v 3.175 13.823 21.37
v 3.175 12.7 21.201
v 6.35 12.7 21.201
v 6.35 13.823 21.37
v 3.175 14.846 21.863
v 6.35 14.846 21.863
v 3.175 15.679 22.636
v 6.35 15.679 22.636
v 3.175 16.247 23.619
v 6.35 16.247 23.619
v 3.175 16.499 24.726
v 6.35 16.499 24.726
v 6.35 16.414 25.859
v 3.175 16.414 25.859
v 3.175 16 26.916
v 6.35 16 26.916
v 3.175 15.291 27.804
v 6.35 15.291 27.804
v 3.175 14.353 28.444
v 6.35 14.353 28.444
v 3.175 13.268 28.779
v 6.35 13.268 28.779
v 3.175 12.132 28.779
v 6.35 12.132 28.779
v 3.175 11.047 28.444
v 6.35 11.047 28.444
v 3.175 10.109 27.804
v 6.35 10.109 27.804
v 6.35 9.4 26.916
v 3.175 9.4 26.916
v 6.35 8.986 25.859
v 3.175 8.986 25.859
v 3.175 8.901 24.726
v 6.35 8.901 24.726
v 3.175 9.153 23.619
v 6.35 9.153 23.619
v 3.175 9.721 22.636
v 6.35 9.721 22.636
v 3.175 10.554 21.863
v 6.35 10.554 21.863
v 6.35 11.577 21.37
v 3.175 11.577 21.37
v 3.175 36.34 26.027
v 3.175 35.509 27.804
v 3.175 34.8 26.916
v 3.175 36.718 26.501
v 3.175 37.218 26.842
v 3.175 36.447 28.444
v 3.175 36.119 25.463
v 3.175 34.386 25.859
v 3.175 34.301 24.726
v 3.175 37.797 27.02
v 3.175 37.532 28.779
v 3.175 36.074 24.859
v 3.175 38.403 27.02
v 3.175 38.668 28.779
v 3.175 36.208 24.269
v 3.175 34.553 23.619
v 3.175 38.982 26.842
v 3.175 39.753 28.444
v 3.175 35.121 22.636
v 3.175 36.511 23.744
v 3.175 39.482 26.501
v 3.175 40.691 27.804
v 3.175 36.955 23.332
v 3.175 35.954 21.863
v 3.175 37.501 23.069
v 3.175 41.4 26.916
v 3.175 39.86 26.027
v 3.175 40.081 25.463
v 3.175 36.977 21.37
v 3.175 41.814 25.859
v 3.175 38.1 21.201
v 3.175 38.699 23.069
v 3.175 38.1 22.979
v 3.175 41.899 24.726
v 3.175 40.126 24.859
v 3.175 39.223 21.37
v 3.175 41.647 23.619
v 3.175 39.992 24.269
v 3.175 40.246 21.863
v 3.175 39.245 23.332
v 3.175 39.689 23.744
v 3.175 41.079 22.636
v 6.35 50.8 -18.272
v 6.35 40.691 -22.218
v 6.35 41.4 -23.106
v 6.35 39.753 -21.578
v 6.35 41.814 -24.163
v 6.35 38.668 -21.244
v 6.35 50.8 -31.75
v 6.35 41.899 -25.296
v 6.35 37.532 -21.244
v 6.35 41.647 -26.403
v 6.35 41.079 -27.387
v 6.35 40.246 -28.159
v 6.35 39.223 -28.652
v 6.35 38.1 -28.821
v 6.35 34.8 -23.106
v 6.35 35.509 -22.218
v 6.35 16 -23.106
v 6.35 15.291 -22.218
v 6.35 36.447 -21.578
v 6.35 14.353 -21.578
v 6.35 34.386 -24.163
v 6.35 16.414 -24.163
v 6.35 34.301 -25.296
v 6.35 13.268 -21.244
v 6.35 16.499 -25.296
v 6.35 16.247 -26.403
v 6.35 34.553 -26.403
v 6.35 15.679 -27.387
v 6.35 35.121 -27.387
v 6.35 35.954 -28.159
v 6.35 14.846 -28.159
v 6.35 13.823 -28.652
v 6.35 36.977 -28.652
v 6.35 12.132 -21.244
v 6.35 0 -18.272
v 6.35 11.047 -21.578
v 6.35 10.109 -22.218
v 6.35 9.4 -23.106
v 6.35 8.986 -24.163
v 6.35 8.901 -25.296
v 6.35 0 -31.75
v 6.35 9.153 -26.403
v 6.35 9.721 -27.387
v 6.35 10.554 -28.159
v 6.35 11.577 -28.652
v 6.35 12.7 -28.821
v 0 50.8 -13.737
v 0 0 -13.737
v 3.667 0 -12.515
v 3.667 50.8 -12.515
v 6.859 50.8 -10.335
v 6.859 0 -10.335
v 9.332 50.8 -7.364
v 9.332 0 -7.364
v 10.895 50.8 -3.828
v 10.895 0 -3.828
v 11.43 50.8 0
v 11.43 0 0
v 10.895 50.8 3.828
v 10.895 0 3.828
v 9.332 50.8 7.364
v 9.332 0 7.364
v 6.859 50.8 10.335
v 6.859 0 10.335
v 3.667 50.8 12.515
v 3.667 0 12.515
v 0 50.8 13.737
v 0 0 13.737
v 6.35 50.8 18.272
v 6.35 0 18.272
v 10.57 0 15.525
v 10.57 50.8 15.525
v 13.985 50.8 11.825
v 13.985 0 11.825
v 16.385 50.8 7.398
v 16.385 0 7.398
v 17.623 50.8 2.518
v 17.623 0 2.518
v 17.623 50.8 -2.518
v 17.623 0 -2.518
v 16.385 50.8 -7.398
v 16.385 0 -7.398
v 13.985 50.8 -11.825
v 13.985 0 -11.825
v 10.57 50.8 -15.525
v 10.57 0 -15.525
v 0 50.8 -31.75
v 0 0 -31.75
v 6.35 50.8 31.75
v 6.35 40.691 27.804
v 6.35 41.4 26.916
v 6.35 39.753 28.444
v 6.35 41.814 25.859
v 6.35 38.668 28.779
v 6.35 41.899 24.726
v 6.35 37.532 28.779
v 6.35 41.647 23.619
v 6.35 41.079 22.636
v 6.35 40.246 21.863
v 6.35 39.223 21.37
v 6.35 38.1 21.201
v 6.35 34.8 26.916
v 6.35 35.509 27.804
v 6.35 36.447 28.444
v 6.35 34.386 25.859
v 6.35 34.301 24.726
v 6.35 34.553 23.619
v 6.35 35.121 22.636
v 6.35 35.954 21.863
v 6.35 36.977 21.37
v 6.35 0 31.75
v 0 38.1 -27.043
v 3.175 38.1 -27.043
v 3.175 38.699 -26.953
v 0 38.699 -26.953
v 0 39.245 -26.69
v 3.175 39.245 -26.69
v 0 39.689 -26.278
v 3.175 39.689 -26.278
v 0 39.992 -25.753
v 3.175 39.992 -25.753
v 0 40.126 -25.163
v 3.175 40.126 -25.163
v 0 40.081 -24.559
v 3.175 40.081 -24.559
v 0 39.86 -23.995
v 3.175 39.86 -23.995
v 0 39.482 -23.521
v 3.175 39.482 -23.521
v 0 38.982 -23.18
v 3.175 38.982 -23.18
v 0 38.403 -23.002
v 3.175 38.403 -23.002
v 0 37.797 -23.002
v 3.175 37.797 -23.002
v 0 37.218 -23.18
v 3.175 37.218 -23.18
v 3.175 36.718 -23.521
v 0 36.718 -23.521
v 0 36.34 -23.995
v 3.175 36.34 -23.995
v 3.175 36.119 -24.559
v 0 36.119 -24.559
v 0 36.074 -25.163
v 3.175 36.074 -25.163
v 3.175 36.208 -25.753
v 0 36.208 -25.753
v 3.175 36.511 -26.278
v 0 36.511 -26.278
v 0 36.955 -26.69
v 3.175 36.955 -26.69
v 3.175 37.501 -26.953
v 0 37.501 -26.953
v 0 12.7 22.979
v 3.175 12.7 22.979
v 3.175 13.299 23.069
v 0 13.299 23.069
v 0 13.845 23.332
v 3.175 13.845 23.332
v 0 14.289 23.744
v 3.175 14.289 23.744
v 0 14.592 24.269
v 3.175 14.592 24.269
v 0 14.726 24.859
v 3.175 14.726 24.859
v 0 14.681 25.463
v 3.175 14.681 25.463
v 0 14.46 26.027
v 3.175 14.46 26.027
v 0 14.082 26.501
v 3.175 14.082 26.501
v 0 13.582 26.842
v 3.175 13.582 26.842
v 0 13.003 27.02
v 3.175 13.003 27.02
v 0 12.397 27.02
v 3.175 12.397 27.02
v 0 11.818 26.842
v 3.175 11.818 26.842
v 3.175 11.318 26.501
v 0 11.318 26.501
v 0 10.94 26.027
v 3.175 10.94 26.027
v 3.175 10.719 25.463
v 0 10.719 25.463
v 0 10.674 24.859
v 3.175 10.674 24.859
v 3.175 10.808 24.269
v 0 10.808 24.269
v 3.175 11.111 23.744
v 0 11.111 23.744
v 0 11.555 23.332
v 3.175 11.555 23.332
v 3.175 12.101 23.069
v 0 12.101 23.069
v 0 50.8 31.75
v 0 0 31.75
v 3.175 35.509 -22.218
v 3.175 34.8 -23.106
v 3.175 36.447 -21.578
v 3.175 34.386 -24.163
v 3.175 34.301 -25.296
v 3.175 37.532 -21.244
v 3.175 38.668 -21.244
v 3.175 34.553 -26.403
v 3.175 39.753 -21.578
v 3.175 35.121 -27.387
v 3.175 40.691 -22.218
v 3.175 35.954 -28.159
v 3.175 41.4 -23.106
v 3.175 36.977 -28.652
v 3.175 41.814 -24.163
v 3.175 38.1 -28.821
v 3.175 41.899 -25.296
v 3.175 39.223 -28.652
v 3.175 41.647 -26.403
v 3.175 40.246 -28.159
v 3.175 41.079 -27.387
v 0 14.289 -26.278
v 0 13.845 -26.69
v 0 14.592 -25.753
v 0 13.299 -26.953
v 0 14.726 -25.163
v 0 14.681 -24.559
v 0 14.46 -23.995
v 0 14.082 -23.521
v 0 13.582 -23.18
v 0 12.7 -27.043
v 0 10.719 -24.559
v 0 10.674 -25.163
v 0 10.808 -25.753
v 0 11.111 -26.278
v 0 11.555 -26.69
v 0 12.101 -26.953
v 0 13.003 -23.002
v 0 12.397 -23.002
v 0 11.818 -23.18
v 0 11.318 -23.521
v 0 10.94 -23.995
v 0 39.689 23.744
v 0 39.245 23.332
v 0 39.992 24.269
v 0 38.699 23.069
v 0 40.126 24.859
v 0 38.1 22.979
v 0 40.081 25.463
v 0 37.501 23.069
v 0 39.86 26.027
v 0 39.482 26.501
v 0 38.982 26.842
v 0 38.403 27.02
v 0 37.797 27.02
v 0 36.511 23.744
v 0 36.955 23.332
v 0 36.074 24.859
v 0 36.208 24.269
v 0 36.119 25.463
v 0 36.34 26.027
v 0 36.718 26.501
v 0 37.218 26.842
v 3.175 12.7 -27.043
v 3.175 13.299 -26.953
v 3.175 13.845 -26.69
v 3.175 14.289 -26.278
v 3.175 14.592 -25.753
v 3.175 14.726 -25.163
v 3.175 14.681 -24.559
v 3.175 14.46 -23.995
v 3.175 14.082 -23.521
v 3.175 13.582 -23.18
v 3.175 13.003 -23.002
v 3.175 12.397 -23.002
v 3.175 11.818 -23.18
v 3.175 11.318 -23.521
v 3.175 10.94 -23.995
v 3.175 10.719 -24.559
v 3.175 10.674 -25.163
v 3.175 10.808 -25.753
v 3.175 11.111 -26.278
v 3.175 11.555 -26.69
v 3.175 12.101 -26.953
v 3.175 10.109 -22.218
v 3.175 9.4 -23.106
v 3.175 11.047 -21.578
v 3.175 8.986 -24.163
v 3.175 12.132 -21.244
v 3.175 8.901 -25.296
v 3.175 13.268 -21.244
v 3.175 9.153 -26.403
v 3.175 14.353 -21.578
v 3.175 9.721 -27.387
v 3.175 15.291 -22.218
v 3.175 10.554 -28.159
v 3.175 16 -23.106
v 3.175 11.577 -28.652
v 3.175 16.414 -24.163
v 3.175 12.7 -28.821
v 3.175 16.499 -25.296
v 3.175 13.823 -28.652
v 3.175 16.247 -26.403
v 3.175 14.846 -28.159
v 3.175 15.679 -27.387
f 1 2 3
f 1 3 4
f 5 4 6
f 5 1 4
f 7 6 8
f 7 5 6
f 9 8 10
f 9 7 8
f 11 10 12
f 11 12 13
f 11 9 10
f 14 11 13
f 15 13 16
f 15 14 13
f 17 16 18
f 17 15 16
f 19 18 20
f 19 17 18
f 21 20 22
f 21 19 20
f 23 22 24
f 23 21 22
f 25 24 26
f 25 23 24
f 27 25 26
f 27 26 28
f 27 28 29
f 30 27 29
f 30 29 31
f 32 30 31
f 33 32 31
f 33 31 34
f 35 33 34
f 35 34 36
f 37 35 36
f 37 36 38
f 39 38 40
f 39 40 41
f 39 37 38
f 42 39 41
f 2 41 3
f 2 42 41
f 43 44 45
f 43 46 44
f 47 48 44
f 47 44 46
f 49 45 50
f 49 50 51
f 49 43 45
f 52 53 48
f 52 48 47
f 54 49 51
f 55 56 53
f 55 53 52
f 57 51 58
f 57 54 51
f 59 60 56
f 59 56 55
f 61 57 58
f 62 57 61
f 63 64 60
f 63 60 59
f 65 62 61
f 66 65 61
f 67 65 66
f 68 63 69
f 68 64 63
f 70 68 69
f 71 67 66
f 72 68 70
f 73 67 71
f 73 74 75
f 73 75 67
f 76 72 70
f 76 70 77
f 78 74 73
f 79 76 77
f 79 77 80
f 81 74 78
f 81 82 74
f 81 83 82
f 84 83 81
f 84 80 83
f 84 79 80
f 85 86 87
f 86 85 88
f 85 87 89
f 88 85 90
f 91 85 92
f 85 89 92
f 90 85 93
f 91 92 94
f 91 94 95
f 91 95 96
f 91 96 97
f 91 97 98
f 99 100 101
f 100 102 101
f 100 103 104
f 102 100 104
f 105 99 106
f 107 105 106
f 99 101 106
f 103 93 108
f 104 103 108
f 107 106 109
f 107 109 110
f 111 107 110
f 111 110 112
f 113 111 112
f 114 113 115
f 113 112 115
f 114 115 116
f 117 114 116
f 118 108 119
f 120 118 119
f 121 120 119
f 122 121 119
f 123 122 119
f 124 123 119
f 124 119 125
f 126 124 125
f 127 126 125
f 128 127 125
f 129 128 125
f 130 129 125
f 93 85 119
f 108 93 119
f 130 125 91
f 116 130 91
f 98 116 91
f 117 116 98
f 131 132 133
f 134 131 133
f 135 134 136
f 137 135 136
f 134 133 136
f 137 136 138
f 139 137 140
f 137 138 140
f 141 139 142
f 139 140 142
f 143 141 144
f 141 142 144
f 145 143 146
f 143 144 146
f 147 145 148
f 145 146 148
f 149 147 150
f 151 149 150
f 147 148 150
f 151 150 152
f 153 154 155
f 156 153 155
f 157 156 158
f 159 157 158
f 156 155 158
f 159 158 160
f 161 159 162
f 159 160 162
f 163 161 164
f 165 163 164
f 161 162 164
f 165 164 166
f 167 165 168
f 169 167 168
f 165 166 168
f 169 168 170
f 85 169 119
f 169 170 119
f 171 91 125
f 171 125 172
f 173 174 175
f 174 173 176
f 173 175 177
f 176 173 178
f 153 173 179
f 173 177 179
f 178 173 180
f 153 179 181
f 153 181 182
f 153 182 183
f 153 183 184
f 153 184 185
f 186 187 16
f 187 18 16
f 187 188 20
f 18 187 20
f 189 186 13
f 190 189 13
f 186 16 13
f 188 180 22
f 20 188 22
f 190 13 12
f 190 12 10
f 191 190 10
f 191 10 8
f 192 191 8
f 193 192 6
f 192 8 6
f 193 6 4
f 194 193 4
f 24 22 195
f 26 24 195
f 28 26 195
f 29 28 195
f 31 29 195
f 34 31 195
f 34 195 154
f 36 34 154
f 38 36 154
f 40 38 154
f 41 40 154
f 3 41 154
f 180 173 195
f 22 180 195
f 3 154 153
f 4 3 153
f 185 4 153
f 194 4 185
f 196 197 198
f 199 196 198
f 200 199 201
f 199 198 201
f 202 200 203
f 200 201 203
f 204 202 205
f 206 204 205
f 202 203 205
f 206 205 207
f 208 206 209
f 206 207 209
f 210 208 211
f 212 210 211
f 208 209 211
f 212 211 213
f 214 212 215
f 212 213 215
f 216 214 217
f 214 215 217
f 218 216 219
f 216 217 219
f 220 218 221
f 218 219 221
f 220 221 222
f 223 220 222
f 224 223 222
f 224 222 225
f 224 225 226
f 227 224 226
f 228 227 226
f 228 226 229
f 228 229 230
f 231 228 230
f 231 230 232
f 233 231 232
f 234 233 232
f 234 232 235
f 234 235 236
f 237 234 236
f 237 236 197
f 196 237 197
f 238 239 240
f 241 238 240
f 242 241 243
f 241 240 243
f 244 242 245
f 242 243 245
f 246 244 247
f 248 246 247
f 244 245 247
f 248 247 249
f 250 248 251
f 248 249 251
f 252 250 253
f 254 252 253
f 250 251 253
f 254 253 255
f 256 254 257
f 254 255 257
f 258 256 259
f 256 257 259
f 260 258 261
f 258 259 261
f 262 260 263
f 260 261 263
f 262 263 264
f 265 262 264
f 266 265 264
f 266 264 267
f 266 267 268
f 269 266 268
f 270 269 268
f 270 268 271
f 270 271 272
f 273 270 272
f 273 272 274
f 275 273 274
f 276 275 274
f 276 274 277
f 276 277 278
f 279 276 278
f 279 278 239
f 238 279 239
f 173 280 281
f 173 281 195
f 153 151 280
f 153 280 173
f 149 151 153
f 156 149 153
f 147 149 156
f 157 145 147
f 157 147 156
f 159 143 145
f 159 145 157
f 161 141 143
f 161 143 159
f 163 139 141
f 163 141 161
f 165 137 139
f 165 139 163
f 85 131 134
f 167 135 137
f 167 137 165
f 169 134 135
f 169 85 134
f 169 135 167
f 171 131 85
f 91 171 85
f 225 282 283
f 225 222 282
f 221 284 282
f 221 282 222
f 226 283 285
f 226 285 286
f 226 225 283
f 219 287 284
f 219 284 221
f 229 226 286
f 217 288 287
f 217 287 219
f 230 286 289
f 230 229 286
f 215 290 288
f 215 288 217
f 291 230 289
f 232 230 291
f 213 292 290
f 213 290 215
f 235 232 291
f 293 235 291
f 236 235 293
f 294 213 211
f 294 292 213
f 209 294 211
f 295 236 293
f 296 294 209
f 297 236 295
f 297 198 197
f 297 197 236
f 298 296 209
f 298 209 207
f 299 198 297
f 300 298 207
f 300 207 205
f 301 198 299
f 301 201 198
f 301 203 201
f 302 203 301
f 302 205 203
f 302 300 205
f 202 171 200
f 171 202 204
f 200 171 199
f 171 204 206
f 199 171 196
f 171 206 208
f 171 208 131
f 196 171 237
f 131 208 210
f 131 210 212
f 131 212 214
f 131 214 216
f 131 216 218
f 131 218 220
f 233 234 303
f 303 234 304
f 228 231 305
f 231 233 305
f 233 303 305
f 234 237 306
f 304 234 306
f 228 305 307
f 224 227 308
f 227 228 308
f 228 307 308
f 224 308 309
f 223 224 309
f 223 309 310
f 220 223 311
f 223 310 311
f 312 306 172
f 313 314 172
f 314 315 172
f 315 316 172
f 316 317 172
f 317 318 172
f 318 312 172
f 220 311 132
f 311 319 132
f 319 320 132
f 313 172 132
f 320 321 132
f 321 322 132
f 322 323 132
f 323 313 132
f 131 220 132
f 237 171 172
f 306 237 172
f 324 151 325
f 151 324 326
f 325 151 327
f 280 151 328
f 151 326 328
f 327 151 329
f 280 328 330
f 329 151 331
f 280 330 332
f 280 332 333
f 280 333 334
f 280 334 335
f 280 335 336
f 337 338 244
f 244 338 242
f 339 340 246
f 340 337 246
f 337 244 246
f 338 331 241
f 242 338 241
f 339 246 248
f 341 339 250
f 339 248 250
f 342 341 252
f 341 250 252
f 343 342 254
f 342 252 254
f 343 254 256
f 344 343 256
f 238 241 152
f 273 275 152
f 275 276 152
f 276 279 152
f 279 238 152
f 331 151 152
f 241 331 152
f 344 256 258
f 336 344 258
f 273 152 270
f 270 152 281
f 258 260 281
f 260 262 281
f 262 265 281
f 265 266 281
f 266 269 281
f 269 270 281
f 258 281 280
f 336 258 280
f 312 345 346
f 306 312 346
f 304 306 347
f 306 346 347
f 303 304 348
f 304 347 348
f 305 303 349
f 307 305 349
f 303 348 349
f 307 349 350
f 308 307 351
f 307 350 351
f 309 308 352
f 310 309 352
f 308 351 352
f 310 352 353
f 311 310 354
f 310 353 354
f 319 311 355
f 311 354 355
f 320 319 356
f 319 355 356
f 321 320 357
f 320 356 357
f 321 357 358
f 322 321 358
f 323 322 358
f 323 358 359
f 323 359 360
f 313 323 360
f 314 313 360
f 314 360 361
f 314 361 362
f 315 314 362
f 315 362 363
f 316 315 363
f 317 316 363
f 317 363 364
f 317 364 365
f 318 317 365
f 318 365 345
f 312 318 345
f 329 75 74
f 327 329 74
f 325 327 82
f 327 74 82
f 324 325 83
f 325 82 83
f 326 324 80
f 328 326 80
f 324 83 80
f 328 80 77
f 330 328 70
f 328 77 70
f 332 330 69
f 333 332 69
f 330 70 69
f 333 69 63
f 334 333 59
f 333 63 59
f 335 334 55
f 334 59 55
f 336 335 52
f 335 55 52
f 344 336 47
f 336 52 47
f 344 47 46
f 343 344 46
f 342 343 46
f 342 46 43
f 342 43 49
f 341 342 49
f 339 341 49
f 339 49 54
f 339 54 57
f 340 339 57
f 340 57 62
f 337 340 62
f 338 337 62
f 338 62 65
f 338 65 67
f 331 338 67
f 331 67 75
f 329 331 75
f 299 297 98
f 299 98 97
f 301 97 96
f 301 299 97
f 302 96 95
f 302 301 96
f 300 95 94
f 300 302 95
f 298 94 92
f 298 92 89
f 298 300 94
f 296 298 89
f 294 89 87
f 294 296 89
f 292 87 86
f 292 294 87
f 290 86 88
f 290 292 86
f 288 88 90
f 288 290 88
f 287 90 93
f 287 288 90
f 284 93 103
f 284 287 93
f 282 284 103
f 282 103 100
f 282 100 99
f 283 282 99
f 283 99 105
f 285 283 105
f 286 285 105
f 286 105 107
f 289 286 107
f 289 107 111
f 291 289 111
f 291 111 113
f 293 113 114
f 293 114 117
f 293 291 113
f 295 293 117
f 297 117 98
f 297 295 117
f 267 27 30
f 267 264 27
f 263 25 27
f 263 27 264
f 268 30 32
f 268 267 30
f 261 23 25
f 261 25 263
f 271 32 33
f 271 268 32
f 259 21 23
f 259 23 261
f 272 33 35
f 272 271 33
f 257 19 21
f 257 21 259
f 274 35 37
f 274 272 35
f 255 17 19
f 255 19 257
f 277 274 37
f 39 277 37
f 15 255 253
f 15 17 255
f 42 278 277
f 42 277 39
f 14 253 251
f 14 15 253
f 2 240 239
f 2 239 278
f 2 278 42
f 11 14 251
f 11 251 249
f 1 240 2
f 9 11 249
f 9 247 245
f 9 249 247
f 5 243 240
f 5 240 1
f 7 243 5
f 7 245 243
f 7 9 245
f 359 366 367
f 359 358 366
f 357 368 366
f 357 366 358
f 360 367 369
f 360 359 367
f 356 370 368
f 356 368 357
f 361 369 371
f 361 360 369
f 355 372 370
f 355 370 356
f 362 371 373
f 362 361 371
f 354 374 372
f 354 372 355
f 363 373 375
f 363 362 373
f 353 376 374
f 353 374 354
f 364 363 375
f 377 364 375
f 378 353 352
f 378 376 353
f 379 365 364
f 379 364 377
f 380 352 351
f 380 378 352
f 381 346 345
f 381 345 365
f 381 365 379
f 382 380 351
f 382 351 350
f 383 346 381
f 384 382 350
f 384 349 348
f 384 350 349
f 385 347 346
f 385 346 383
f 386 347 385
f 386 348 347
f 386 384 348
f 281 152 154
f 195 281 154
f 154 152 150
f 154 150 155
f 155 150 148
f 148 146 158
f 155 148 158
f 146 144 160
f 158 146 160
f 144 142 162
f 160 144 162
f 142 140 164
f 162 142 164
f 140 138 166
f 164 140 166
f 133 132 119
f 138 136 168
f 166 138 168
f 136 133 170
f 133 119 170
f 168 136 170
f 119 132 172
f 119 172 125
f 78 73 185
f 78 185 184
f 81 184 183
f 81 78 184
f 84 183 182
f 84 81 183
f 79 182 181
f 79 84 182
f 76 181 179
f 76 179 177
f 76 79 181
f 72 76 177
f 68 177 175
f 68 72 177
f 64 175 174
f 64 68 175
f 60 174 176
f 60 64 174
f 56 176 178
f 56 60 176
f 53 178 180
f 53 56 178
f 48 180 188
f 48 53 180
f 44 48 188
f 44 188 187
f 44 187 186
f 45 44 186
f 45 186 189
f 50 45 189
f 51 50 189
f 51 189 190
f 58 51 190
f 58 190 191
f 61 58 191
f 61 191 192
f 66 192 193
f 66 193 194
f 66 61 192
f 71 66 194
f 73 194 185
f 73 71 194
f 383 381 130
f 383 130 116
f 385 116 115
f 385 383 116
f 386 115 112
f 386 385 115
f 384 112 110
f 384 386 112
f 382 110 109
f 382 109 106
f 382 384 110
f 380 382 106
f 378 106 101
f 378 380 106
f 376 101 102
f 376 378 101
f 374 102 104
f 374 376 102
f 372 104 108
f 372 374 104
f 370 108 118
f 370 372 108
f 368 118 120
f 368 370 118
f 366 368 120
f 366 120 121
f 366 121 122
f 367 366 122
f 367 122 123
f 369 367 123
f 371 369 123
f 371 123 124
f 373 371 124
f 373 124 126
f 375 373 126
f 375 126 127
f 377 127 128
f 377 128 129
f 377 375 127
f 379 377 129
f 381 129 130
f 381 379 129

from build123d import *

# Parameters (mm, degrees)
BOSS_EXTRUDE1_DEPTH     = 50.8
SKETCH2_R               = 2.032
CUT_EXTRUDE1_DEPTH      = 12.43
CUT_EXTRUDE1_DEPTH_BACK = 7.35
CUT_EXTRUDE2_START      = -3.175
SKETCH3_R               = 3.81
CUT_EXTRUDE2_DEPTH      = 3.175


with BuildPart() as part:
    # Sketch1 → Boss-Extrude1 (new body)
    with BuildSketch(Plane(origin=(0, 0, 0), x_dir=(1, 0, 0), z_dir=(0, 1, 0))):
        with BuildLine():
            ThreePointArc((6.35, -18.272118104), (17.78, 0), (6.35, 18.272118104))
            Line((6.35, 18.272118104), (6.35, 25.4))
            Line((6.35, 25.4), (6.35, 31.75))
            Line((6.35, 31.75), (0, 31.75))
            Line((0, 31.75), (0, 13.73715036))
            ThreePointArc((0, 13.73715036), (11.43, 0), (0, -13.73715036))
            Line((0, -13.73715036), (0, -31.75))
            Line((0, -31.75), (6.35, -31.75))
            Line((6.35, -31.75), (6.35, -25.4))
            Line((6.35, -25.4), (6.35, -18.272118104))
        make_face()
    extrude(amount=BOSS_EXTRUDE1_DEPTH)

    # Sketch2 → Cut-Extrude1 (cut, two sides)
    with BuildSketch(Plane(origin=(6.35, 0, 0), x_dir=(0, 0, -1), z_dir=(1, 0, 0))) as cut_extrude1_sk:
        with Locations((25.011059052, 38.1)):
            Circle(SKETCH2_R)
        with Locations((25.011059052, 12.7)):
            Circle(SKETCH2_R)
        with Locations((-25.011059052, 12.7)):
            Circle(SKETCH2_R)
        with Locations((-25.011059052, 38.1)):
            Circle(SKETCH2_R)
    extrude(amount=CUT_EXTRUDE1_DEPTH, mode=Mode.SUBTRACT)
    extrude(cut_extrude1_sk.sketch, amount=-CUT_EXTRUDE1_DEPTH_BACK, mode=Mode.SUBTRACT)

    # Sketch3 → Cut-Extrude2 (cut)
    with BuildSketch(Plane(origin=(6.35, 0, 0), x_dir=(0, 0, -1), z_dir=(1, 0, 0)).offset(CUT_EXTRUDE2_START)):
        with Locations((25.011059052, 38.1)):
            Circle(SKETCH3_R)
        with Locations((25.011059052, 12.7)):
            Circle(SKETCH3_R)
        with Locations((-25.011059052, 38.1)):
            Circle(SKETCH3_R)
        with Locations((-25.011059052, 12.7)):
            Circle(SKETCH3_R)
    extrude(amount=CUT_EXTRUDE2_DEPTH, mode=Mode.SUBTRACT)


solid = part.part
